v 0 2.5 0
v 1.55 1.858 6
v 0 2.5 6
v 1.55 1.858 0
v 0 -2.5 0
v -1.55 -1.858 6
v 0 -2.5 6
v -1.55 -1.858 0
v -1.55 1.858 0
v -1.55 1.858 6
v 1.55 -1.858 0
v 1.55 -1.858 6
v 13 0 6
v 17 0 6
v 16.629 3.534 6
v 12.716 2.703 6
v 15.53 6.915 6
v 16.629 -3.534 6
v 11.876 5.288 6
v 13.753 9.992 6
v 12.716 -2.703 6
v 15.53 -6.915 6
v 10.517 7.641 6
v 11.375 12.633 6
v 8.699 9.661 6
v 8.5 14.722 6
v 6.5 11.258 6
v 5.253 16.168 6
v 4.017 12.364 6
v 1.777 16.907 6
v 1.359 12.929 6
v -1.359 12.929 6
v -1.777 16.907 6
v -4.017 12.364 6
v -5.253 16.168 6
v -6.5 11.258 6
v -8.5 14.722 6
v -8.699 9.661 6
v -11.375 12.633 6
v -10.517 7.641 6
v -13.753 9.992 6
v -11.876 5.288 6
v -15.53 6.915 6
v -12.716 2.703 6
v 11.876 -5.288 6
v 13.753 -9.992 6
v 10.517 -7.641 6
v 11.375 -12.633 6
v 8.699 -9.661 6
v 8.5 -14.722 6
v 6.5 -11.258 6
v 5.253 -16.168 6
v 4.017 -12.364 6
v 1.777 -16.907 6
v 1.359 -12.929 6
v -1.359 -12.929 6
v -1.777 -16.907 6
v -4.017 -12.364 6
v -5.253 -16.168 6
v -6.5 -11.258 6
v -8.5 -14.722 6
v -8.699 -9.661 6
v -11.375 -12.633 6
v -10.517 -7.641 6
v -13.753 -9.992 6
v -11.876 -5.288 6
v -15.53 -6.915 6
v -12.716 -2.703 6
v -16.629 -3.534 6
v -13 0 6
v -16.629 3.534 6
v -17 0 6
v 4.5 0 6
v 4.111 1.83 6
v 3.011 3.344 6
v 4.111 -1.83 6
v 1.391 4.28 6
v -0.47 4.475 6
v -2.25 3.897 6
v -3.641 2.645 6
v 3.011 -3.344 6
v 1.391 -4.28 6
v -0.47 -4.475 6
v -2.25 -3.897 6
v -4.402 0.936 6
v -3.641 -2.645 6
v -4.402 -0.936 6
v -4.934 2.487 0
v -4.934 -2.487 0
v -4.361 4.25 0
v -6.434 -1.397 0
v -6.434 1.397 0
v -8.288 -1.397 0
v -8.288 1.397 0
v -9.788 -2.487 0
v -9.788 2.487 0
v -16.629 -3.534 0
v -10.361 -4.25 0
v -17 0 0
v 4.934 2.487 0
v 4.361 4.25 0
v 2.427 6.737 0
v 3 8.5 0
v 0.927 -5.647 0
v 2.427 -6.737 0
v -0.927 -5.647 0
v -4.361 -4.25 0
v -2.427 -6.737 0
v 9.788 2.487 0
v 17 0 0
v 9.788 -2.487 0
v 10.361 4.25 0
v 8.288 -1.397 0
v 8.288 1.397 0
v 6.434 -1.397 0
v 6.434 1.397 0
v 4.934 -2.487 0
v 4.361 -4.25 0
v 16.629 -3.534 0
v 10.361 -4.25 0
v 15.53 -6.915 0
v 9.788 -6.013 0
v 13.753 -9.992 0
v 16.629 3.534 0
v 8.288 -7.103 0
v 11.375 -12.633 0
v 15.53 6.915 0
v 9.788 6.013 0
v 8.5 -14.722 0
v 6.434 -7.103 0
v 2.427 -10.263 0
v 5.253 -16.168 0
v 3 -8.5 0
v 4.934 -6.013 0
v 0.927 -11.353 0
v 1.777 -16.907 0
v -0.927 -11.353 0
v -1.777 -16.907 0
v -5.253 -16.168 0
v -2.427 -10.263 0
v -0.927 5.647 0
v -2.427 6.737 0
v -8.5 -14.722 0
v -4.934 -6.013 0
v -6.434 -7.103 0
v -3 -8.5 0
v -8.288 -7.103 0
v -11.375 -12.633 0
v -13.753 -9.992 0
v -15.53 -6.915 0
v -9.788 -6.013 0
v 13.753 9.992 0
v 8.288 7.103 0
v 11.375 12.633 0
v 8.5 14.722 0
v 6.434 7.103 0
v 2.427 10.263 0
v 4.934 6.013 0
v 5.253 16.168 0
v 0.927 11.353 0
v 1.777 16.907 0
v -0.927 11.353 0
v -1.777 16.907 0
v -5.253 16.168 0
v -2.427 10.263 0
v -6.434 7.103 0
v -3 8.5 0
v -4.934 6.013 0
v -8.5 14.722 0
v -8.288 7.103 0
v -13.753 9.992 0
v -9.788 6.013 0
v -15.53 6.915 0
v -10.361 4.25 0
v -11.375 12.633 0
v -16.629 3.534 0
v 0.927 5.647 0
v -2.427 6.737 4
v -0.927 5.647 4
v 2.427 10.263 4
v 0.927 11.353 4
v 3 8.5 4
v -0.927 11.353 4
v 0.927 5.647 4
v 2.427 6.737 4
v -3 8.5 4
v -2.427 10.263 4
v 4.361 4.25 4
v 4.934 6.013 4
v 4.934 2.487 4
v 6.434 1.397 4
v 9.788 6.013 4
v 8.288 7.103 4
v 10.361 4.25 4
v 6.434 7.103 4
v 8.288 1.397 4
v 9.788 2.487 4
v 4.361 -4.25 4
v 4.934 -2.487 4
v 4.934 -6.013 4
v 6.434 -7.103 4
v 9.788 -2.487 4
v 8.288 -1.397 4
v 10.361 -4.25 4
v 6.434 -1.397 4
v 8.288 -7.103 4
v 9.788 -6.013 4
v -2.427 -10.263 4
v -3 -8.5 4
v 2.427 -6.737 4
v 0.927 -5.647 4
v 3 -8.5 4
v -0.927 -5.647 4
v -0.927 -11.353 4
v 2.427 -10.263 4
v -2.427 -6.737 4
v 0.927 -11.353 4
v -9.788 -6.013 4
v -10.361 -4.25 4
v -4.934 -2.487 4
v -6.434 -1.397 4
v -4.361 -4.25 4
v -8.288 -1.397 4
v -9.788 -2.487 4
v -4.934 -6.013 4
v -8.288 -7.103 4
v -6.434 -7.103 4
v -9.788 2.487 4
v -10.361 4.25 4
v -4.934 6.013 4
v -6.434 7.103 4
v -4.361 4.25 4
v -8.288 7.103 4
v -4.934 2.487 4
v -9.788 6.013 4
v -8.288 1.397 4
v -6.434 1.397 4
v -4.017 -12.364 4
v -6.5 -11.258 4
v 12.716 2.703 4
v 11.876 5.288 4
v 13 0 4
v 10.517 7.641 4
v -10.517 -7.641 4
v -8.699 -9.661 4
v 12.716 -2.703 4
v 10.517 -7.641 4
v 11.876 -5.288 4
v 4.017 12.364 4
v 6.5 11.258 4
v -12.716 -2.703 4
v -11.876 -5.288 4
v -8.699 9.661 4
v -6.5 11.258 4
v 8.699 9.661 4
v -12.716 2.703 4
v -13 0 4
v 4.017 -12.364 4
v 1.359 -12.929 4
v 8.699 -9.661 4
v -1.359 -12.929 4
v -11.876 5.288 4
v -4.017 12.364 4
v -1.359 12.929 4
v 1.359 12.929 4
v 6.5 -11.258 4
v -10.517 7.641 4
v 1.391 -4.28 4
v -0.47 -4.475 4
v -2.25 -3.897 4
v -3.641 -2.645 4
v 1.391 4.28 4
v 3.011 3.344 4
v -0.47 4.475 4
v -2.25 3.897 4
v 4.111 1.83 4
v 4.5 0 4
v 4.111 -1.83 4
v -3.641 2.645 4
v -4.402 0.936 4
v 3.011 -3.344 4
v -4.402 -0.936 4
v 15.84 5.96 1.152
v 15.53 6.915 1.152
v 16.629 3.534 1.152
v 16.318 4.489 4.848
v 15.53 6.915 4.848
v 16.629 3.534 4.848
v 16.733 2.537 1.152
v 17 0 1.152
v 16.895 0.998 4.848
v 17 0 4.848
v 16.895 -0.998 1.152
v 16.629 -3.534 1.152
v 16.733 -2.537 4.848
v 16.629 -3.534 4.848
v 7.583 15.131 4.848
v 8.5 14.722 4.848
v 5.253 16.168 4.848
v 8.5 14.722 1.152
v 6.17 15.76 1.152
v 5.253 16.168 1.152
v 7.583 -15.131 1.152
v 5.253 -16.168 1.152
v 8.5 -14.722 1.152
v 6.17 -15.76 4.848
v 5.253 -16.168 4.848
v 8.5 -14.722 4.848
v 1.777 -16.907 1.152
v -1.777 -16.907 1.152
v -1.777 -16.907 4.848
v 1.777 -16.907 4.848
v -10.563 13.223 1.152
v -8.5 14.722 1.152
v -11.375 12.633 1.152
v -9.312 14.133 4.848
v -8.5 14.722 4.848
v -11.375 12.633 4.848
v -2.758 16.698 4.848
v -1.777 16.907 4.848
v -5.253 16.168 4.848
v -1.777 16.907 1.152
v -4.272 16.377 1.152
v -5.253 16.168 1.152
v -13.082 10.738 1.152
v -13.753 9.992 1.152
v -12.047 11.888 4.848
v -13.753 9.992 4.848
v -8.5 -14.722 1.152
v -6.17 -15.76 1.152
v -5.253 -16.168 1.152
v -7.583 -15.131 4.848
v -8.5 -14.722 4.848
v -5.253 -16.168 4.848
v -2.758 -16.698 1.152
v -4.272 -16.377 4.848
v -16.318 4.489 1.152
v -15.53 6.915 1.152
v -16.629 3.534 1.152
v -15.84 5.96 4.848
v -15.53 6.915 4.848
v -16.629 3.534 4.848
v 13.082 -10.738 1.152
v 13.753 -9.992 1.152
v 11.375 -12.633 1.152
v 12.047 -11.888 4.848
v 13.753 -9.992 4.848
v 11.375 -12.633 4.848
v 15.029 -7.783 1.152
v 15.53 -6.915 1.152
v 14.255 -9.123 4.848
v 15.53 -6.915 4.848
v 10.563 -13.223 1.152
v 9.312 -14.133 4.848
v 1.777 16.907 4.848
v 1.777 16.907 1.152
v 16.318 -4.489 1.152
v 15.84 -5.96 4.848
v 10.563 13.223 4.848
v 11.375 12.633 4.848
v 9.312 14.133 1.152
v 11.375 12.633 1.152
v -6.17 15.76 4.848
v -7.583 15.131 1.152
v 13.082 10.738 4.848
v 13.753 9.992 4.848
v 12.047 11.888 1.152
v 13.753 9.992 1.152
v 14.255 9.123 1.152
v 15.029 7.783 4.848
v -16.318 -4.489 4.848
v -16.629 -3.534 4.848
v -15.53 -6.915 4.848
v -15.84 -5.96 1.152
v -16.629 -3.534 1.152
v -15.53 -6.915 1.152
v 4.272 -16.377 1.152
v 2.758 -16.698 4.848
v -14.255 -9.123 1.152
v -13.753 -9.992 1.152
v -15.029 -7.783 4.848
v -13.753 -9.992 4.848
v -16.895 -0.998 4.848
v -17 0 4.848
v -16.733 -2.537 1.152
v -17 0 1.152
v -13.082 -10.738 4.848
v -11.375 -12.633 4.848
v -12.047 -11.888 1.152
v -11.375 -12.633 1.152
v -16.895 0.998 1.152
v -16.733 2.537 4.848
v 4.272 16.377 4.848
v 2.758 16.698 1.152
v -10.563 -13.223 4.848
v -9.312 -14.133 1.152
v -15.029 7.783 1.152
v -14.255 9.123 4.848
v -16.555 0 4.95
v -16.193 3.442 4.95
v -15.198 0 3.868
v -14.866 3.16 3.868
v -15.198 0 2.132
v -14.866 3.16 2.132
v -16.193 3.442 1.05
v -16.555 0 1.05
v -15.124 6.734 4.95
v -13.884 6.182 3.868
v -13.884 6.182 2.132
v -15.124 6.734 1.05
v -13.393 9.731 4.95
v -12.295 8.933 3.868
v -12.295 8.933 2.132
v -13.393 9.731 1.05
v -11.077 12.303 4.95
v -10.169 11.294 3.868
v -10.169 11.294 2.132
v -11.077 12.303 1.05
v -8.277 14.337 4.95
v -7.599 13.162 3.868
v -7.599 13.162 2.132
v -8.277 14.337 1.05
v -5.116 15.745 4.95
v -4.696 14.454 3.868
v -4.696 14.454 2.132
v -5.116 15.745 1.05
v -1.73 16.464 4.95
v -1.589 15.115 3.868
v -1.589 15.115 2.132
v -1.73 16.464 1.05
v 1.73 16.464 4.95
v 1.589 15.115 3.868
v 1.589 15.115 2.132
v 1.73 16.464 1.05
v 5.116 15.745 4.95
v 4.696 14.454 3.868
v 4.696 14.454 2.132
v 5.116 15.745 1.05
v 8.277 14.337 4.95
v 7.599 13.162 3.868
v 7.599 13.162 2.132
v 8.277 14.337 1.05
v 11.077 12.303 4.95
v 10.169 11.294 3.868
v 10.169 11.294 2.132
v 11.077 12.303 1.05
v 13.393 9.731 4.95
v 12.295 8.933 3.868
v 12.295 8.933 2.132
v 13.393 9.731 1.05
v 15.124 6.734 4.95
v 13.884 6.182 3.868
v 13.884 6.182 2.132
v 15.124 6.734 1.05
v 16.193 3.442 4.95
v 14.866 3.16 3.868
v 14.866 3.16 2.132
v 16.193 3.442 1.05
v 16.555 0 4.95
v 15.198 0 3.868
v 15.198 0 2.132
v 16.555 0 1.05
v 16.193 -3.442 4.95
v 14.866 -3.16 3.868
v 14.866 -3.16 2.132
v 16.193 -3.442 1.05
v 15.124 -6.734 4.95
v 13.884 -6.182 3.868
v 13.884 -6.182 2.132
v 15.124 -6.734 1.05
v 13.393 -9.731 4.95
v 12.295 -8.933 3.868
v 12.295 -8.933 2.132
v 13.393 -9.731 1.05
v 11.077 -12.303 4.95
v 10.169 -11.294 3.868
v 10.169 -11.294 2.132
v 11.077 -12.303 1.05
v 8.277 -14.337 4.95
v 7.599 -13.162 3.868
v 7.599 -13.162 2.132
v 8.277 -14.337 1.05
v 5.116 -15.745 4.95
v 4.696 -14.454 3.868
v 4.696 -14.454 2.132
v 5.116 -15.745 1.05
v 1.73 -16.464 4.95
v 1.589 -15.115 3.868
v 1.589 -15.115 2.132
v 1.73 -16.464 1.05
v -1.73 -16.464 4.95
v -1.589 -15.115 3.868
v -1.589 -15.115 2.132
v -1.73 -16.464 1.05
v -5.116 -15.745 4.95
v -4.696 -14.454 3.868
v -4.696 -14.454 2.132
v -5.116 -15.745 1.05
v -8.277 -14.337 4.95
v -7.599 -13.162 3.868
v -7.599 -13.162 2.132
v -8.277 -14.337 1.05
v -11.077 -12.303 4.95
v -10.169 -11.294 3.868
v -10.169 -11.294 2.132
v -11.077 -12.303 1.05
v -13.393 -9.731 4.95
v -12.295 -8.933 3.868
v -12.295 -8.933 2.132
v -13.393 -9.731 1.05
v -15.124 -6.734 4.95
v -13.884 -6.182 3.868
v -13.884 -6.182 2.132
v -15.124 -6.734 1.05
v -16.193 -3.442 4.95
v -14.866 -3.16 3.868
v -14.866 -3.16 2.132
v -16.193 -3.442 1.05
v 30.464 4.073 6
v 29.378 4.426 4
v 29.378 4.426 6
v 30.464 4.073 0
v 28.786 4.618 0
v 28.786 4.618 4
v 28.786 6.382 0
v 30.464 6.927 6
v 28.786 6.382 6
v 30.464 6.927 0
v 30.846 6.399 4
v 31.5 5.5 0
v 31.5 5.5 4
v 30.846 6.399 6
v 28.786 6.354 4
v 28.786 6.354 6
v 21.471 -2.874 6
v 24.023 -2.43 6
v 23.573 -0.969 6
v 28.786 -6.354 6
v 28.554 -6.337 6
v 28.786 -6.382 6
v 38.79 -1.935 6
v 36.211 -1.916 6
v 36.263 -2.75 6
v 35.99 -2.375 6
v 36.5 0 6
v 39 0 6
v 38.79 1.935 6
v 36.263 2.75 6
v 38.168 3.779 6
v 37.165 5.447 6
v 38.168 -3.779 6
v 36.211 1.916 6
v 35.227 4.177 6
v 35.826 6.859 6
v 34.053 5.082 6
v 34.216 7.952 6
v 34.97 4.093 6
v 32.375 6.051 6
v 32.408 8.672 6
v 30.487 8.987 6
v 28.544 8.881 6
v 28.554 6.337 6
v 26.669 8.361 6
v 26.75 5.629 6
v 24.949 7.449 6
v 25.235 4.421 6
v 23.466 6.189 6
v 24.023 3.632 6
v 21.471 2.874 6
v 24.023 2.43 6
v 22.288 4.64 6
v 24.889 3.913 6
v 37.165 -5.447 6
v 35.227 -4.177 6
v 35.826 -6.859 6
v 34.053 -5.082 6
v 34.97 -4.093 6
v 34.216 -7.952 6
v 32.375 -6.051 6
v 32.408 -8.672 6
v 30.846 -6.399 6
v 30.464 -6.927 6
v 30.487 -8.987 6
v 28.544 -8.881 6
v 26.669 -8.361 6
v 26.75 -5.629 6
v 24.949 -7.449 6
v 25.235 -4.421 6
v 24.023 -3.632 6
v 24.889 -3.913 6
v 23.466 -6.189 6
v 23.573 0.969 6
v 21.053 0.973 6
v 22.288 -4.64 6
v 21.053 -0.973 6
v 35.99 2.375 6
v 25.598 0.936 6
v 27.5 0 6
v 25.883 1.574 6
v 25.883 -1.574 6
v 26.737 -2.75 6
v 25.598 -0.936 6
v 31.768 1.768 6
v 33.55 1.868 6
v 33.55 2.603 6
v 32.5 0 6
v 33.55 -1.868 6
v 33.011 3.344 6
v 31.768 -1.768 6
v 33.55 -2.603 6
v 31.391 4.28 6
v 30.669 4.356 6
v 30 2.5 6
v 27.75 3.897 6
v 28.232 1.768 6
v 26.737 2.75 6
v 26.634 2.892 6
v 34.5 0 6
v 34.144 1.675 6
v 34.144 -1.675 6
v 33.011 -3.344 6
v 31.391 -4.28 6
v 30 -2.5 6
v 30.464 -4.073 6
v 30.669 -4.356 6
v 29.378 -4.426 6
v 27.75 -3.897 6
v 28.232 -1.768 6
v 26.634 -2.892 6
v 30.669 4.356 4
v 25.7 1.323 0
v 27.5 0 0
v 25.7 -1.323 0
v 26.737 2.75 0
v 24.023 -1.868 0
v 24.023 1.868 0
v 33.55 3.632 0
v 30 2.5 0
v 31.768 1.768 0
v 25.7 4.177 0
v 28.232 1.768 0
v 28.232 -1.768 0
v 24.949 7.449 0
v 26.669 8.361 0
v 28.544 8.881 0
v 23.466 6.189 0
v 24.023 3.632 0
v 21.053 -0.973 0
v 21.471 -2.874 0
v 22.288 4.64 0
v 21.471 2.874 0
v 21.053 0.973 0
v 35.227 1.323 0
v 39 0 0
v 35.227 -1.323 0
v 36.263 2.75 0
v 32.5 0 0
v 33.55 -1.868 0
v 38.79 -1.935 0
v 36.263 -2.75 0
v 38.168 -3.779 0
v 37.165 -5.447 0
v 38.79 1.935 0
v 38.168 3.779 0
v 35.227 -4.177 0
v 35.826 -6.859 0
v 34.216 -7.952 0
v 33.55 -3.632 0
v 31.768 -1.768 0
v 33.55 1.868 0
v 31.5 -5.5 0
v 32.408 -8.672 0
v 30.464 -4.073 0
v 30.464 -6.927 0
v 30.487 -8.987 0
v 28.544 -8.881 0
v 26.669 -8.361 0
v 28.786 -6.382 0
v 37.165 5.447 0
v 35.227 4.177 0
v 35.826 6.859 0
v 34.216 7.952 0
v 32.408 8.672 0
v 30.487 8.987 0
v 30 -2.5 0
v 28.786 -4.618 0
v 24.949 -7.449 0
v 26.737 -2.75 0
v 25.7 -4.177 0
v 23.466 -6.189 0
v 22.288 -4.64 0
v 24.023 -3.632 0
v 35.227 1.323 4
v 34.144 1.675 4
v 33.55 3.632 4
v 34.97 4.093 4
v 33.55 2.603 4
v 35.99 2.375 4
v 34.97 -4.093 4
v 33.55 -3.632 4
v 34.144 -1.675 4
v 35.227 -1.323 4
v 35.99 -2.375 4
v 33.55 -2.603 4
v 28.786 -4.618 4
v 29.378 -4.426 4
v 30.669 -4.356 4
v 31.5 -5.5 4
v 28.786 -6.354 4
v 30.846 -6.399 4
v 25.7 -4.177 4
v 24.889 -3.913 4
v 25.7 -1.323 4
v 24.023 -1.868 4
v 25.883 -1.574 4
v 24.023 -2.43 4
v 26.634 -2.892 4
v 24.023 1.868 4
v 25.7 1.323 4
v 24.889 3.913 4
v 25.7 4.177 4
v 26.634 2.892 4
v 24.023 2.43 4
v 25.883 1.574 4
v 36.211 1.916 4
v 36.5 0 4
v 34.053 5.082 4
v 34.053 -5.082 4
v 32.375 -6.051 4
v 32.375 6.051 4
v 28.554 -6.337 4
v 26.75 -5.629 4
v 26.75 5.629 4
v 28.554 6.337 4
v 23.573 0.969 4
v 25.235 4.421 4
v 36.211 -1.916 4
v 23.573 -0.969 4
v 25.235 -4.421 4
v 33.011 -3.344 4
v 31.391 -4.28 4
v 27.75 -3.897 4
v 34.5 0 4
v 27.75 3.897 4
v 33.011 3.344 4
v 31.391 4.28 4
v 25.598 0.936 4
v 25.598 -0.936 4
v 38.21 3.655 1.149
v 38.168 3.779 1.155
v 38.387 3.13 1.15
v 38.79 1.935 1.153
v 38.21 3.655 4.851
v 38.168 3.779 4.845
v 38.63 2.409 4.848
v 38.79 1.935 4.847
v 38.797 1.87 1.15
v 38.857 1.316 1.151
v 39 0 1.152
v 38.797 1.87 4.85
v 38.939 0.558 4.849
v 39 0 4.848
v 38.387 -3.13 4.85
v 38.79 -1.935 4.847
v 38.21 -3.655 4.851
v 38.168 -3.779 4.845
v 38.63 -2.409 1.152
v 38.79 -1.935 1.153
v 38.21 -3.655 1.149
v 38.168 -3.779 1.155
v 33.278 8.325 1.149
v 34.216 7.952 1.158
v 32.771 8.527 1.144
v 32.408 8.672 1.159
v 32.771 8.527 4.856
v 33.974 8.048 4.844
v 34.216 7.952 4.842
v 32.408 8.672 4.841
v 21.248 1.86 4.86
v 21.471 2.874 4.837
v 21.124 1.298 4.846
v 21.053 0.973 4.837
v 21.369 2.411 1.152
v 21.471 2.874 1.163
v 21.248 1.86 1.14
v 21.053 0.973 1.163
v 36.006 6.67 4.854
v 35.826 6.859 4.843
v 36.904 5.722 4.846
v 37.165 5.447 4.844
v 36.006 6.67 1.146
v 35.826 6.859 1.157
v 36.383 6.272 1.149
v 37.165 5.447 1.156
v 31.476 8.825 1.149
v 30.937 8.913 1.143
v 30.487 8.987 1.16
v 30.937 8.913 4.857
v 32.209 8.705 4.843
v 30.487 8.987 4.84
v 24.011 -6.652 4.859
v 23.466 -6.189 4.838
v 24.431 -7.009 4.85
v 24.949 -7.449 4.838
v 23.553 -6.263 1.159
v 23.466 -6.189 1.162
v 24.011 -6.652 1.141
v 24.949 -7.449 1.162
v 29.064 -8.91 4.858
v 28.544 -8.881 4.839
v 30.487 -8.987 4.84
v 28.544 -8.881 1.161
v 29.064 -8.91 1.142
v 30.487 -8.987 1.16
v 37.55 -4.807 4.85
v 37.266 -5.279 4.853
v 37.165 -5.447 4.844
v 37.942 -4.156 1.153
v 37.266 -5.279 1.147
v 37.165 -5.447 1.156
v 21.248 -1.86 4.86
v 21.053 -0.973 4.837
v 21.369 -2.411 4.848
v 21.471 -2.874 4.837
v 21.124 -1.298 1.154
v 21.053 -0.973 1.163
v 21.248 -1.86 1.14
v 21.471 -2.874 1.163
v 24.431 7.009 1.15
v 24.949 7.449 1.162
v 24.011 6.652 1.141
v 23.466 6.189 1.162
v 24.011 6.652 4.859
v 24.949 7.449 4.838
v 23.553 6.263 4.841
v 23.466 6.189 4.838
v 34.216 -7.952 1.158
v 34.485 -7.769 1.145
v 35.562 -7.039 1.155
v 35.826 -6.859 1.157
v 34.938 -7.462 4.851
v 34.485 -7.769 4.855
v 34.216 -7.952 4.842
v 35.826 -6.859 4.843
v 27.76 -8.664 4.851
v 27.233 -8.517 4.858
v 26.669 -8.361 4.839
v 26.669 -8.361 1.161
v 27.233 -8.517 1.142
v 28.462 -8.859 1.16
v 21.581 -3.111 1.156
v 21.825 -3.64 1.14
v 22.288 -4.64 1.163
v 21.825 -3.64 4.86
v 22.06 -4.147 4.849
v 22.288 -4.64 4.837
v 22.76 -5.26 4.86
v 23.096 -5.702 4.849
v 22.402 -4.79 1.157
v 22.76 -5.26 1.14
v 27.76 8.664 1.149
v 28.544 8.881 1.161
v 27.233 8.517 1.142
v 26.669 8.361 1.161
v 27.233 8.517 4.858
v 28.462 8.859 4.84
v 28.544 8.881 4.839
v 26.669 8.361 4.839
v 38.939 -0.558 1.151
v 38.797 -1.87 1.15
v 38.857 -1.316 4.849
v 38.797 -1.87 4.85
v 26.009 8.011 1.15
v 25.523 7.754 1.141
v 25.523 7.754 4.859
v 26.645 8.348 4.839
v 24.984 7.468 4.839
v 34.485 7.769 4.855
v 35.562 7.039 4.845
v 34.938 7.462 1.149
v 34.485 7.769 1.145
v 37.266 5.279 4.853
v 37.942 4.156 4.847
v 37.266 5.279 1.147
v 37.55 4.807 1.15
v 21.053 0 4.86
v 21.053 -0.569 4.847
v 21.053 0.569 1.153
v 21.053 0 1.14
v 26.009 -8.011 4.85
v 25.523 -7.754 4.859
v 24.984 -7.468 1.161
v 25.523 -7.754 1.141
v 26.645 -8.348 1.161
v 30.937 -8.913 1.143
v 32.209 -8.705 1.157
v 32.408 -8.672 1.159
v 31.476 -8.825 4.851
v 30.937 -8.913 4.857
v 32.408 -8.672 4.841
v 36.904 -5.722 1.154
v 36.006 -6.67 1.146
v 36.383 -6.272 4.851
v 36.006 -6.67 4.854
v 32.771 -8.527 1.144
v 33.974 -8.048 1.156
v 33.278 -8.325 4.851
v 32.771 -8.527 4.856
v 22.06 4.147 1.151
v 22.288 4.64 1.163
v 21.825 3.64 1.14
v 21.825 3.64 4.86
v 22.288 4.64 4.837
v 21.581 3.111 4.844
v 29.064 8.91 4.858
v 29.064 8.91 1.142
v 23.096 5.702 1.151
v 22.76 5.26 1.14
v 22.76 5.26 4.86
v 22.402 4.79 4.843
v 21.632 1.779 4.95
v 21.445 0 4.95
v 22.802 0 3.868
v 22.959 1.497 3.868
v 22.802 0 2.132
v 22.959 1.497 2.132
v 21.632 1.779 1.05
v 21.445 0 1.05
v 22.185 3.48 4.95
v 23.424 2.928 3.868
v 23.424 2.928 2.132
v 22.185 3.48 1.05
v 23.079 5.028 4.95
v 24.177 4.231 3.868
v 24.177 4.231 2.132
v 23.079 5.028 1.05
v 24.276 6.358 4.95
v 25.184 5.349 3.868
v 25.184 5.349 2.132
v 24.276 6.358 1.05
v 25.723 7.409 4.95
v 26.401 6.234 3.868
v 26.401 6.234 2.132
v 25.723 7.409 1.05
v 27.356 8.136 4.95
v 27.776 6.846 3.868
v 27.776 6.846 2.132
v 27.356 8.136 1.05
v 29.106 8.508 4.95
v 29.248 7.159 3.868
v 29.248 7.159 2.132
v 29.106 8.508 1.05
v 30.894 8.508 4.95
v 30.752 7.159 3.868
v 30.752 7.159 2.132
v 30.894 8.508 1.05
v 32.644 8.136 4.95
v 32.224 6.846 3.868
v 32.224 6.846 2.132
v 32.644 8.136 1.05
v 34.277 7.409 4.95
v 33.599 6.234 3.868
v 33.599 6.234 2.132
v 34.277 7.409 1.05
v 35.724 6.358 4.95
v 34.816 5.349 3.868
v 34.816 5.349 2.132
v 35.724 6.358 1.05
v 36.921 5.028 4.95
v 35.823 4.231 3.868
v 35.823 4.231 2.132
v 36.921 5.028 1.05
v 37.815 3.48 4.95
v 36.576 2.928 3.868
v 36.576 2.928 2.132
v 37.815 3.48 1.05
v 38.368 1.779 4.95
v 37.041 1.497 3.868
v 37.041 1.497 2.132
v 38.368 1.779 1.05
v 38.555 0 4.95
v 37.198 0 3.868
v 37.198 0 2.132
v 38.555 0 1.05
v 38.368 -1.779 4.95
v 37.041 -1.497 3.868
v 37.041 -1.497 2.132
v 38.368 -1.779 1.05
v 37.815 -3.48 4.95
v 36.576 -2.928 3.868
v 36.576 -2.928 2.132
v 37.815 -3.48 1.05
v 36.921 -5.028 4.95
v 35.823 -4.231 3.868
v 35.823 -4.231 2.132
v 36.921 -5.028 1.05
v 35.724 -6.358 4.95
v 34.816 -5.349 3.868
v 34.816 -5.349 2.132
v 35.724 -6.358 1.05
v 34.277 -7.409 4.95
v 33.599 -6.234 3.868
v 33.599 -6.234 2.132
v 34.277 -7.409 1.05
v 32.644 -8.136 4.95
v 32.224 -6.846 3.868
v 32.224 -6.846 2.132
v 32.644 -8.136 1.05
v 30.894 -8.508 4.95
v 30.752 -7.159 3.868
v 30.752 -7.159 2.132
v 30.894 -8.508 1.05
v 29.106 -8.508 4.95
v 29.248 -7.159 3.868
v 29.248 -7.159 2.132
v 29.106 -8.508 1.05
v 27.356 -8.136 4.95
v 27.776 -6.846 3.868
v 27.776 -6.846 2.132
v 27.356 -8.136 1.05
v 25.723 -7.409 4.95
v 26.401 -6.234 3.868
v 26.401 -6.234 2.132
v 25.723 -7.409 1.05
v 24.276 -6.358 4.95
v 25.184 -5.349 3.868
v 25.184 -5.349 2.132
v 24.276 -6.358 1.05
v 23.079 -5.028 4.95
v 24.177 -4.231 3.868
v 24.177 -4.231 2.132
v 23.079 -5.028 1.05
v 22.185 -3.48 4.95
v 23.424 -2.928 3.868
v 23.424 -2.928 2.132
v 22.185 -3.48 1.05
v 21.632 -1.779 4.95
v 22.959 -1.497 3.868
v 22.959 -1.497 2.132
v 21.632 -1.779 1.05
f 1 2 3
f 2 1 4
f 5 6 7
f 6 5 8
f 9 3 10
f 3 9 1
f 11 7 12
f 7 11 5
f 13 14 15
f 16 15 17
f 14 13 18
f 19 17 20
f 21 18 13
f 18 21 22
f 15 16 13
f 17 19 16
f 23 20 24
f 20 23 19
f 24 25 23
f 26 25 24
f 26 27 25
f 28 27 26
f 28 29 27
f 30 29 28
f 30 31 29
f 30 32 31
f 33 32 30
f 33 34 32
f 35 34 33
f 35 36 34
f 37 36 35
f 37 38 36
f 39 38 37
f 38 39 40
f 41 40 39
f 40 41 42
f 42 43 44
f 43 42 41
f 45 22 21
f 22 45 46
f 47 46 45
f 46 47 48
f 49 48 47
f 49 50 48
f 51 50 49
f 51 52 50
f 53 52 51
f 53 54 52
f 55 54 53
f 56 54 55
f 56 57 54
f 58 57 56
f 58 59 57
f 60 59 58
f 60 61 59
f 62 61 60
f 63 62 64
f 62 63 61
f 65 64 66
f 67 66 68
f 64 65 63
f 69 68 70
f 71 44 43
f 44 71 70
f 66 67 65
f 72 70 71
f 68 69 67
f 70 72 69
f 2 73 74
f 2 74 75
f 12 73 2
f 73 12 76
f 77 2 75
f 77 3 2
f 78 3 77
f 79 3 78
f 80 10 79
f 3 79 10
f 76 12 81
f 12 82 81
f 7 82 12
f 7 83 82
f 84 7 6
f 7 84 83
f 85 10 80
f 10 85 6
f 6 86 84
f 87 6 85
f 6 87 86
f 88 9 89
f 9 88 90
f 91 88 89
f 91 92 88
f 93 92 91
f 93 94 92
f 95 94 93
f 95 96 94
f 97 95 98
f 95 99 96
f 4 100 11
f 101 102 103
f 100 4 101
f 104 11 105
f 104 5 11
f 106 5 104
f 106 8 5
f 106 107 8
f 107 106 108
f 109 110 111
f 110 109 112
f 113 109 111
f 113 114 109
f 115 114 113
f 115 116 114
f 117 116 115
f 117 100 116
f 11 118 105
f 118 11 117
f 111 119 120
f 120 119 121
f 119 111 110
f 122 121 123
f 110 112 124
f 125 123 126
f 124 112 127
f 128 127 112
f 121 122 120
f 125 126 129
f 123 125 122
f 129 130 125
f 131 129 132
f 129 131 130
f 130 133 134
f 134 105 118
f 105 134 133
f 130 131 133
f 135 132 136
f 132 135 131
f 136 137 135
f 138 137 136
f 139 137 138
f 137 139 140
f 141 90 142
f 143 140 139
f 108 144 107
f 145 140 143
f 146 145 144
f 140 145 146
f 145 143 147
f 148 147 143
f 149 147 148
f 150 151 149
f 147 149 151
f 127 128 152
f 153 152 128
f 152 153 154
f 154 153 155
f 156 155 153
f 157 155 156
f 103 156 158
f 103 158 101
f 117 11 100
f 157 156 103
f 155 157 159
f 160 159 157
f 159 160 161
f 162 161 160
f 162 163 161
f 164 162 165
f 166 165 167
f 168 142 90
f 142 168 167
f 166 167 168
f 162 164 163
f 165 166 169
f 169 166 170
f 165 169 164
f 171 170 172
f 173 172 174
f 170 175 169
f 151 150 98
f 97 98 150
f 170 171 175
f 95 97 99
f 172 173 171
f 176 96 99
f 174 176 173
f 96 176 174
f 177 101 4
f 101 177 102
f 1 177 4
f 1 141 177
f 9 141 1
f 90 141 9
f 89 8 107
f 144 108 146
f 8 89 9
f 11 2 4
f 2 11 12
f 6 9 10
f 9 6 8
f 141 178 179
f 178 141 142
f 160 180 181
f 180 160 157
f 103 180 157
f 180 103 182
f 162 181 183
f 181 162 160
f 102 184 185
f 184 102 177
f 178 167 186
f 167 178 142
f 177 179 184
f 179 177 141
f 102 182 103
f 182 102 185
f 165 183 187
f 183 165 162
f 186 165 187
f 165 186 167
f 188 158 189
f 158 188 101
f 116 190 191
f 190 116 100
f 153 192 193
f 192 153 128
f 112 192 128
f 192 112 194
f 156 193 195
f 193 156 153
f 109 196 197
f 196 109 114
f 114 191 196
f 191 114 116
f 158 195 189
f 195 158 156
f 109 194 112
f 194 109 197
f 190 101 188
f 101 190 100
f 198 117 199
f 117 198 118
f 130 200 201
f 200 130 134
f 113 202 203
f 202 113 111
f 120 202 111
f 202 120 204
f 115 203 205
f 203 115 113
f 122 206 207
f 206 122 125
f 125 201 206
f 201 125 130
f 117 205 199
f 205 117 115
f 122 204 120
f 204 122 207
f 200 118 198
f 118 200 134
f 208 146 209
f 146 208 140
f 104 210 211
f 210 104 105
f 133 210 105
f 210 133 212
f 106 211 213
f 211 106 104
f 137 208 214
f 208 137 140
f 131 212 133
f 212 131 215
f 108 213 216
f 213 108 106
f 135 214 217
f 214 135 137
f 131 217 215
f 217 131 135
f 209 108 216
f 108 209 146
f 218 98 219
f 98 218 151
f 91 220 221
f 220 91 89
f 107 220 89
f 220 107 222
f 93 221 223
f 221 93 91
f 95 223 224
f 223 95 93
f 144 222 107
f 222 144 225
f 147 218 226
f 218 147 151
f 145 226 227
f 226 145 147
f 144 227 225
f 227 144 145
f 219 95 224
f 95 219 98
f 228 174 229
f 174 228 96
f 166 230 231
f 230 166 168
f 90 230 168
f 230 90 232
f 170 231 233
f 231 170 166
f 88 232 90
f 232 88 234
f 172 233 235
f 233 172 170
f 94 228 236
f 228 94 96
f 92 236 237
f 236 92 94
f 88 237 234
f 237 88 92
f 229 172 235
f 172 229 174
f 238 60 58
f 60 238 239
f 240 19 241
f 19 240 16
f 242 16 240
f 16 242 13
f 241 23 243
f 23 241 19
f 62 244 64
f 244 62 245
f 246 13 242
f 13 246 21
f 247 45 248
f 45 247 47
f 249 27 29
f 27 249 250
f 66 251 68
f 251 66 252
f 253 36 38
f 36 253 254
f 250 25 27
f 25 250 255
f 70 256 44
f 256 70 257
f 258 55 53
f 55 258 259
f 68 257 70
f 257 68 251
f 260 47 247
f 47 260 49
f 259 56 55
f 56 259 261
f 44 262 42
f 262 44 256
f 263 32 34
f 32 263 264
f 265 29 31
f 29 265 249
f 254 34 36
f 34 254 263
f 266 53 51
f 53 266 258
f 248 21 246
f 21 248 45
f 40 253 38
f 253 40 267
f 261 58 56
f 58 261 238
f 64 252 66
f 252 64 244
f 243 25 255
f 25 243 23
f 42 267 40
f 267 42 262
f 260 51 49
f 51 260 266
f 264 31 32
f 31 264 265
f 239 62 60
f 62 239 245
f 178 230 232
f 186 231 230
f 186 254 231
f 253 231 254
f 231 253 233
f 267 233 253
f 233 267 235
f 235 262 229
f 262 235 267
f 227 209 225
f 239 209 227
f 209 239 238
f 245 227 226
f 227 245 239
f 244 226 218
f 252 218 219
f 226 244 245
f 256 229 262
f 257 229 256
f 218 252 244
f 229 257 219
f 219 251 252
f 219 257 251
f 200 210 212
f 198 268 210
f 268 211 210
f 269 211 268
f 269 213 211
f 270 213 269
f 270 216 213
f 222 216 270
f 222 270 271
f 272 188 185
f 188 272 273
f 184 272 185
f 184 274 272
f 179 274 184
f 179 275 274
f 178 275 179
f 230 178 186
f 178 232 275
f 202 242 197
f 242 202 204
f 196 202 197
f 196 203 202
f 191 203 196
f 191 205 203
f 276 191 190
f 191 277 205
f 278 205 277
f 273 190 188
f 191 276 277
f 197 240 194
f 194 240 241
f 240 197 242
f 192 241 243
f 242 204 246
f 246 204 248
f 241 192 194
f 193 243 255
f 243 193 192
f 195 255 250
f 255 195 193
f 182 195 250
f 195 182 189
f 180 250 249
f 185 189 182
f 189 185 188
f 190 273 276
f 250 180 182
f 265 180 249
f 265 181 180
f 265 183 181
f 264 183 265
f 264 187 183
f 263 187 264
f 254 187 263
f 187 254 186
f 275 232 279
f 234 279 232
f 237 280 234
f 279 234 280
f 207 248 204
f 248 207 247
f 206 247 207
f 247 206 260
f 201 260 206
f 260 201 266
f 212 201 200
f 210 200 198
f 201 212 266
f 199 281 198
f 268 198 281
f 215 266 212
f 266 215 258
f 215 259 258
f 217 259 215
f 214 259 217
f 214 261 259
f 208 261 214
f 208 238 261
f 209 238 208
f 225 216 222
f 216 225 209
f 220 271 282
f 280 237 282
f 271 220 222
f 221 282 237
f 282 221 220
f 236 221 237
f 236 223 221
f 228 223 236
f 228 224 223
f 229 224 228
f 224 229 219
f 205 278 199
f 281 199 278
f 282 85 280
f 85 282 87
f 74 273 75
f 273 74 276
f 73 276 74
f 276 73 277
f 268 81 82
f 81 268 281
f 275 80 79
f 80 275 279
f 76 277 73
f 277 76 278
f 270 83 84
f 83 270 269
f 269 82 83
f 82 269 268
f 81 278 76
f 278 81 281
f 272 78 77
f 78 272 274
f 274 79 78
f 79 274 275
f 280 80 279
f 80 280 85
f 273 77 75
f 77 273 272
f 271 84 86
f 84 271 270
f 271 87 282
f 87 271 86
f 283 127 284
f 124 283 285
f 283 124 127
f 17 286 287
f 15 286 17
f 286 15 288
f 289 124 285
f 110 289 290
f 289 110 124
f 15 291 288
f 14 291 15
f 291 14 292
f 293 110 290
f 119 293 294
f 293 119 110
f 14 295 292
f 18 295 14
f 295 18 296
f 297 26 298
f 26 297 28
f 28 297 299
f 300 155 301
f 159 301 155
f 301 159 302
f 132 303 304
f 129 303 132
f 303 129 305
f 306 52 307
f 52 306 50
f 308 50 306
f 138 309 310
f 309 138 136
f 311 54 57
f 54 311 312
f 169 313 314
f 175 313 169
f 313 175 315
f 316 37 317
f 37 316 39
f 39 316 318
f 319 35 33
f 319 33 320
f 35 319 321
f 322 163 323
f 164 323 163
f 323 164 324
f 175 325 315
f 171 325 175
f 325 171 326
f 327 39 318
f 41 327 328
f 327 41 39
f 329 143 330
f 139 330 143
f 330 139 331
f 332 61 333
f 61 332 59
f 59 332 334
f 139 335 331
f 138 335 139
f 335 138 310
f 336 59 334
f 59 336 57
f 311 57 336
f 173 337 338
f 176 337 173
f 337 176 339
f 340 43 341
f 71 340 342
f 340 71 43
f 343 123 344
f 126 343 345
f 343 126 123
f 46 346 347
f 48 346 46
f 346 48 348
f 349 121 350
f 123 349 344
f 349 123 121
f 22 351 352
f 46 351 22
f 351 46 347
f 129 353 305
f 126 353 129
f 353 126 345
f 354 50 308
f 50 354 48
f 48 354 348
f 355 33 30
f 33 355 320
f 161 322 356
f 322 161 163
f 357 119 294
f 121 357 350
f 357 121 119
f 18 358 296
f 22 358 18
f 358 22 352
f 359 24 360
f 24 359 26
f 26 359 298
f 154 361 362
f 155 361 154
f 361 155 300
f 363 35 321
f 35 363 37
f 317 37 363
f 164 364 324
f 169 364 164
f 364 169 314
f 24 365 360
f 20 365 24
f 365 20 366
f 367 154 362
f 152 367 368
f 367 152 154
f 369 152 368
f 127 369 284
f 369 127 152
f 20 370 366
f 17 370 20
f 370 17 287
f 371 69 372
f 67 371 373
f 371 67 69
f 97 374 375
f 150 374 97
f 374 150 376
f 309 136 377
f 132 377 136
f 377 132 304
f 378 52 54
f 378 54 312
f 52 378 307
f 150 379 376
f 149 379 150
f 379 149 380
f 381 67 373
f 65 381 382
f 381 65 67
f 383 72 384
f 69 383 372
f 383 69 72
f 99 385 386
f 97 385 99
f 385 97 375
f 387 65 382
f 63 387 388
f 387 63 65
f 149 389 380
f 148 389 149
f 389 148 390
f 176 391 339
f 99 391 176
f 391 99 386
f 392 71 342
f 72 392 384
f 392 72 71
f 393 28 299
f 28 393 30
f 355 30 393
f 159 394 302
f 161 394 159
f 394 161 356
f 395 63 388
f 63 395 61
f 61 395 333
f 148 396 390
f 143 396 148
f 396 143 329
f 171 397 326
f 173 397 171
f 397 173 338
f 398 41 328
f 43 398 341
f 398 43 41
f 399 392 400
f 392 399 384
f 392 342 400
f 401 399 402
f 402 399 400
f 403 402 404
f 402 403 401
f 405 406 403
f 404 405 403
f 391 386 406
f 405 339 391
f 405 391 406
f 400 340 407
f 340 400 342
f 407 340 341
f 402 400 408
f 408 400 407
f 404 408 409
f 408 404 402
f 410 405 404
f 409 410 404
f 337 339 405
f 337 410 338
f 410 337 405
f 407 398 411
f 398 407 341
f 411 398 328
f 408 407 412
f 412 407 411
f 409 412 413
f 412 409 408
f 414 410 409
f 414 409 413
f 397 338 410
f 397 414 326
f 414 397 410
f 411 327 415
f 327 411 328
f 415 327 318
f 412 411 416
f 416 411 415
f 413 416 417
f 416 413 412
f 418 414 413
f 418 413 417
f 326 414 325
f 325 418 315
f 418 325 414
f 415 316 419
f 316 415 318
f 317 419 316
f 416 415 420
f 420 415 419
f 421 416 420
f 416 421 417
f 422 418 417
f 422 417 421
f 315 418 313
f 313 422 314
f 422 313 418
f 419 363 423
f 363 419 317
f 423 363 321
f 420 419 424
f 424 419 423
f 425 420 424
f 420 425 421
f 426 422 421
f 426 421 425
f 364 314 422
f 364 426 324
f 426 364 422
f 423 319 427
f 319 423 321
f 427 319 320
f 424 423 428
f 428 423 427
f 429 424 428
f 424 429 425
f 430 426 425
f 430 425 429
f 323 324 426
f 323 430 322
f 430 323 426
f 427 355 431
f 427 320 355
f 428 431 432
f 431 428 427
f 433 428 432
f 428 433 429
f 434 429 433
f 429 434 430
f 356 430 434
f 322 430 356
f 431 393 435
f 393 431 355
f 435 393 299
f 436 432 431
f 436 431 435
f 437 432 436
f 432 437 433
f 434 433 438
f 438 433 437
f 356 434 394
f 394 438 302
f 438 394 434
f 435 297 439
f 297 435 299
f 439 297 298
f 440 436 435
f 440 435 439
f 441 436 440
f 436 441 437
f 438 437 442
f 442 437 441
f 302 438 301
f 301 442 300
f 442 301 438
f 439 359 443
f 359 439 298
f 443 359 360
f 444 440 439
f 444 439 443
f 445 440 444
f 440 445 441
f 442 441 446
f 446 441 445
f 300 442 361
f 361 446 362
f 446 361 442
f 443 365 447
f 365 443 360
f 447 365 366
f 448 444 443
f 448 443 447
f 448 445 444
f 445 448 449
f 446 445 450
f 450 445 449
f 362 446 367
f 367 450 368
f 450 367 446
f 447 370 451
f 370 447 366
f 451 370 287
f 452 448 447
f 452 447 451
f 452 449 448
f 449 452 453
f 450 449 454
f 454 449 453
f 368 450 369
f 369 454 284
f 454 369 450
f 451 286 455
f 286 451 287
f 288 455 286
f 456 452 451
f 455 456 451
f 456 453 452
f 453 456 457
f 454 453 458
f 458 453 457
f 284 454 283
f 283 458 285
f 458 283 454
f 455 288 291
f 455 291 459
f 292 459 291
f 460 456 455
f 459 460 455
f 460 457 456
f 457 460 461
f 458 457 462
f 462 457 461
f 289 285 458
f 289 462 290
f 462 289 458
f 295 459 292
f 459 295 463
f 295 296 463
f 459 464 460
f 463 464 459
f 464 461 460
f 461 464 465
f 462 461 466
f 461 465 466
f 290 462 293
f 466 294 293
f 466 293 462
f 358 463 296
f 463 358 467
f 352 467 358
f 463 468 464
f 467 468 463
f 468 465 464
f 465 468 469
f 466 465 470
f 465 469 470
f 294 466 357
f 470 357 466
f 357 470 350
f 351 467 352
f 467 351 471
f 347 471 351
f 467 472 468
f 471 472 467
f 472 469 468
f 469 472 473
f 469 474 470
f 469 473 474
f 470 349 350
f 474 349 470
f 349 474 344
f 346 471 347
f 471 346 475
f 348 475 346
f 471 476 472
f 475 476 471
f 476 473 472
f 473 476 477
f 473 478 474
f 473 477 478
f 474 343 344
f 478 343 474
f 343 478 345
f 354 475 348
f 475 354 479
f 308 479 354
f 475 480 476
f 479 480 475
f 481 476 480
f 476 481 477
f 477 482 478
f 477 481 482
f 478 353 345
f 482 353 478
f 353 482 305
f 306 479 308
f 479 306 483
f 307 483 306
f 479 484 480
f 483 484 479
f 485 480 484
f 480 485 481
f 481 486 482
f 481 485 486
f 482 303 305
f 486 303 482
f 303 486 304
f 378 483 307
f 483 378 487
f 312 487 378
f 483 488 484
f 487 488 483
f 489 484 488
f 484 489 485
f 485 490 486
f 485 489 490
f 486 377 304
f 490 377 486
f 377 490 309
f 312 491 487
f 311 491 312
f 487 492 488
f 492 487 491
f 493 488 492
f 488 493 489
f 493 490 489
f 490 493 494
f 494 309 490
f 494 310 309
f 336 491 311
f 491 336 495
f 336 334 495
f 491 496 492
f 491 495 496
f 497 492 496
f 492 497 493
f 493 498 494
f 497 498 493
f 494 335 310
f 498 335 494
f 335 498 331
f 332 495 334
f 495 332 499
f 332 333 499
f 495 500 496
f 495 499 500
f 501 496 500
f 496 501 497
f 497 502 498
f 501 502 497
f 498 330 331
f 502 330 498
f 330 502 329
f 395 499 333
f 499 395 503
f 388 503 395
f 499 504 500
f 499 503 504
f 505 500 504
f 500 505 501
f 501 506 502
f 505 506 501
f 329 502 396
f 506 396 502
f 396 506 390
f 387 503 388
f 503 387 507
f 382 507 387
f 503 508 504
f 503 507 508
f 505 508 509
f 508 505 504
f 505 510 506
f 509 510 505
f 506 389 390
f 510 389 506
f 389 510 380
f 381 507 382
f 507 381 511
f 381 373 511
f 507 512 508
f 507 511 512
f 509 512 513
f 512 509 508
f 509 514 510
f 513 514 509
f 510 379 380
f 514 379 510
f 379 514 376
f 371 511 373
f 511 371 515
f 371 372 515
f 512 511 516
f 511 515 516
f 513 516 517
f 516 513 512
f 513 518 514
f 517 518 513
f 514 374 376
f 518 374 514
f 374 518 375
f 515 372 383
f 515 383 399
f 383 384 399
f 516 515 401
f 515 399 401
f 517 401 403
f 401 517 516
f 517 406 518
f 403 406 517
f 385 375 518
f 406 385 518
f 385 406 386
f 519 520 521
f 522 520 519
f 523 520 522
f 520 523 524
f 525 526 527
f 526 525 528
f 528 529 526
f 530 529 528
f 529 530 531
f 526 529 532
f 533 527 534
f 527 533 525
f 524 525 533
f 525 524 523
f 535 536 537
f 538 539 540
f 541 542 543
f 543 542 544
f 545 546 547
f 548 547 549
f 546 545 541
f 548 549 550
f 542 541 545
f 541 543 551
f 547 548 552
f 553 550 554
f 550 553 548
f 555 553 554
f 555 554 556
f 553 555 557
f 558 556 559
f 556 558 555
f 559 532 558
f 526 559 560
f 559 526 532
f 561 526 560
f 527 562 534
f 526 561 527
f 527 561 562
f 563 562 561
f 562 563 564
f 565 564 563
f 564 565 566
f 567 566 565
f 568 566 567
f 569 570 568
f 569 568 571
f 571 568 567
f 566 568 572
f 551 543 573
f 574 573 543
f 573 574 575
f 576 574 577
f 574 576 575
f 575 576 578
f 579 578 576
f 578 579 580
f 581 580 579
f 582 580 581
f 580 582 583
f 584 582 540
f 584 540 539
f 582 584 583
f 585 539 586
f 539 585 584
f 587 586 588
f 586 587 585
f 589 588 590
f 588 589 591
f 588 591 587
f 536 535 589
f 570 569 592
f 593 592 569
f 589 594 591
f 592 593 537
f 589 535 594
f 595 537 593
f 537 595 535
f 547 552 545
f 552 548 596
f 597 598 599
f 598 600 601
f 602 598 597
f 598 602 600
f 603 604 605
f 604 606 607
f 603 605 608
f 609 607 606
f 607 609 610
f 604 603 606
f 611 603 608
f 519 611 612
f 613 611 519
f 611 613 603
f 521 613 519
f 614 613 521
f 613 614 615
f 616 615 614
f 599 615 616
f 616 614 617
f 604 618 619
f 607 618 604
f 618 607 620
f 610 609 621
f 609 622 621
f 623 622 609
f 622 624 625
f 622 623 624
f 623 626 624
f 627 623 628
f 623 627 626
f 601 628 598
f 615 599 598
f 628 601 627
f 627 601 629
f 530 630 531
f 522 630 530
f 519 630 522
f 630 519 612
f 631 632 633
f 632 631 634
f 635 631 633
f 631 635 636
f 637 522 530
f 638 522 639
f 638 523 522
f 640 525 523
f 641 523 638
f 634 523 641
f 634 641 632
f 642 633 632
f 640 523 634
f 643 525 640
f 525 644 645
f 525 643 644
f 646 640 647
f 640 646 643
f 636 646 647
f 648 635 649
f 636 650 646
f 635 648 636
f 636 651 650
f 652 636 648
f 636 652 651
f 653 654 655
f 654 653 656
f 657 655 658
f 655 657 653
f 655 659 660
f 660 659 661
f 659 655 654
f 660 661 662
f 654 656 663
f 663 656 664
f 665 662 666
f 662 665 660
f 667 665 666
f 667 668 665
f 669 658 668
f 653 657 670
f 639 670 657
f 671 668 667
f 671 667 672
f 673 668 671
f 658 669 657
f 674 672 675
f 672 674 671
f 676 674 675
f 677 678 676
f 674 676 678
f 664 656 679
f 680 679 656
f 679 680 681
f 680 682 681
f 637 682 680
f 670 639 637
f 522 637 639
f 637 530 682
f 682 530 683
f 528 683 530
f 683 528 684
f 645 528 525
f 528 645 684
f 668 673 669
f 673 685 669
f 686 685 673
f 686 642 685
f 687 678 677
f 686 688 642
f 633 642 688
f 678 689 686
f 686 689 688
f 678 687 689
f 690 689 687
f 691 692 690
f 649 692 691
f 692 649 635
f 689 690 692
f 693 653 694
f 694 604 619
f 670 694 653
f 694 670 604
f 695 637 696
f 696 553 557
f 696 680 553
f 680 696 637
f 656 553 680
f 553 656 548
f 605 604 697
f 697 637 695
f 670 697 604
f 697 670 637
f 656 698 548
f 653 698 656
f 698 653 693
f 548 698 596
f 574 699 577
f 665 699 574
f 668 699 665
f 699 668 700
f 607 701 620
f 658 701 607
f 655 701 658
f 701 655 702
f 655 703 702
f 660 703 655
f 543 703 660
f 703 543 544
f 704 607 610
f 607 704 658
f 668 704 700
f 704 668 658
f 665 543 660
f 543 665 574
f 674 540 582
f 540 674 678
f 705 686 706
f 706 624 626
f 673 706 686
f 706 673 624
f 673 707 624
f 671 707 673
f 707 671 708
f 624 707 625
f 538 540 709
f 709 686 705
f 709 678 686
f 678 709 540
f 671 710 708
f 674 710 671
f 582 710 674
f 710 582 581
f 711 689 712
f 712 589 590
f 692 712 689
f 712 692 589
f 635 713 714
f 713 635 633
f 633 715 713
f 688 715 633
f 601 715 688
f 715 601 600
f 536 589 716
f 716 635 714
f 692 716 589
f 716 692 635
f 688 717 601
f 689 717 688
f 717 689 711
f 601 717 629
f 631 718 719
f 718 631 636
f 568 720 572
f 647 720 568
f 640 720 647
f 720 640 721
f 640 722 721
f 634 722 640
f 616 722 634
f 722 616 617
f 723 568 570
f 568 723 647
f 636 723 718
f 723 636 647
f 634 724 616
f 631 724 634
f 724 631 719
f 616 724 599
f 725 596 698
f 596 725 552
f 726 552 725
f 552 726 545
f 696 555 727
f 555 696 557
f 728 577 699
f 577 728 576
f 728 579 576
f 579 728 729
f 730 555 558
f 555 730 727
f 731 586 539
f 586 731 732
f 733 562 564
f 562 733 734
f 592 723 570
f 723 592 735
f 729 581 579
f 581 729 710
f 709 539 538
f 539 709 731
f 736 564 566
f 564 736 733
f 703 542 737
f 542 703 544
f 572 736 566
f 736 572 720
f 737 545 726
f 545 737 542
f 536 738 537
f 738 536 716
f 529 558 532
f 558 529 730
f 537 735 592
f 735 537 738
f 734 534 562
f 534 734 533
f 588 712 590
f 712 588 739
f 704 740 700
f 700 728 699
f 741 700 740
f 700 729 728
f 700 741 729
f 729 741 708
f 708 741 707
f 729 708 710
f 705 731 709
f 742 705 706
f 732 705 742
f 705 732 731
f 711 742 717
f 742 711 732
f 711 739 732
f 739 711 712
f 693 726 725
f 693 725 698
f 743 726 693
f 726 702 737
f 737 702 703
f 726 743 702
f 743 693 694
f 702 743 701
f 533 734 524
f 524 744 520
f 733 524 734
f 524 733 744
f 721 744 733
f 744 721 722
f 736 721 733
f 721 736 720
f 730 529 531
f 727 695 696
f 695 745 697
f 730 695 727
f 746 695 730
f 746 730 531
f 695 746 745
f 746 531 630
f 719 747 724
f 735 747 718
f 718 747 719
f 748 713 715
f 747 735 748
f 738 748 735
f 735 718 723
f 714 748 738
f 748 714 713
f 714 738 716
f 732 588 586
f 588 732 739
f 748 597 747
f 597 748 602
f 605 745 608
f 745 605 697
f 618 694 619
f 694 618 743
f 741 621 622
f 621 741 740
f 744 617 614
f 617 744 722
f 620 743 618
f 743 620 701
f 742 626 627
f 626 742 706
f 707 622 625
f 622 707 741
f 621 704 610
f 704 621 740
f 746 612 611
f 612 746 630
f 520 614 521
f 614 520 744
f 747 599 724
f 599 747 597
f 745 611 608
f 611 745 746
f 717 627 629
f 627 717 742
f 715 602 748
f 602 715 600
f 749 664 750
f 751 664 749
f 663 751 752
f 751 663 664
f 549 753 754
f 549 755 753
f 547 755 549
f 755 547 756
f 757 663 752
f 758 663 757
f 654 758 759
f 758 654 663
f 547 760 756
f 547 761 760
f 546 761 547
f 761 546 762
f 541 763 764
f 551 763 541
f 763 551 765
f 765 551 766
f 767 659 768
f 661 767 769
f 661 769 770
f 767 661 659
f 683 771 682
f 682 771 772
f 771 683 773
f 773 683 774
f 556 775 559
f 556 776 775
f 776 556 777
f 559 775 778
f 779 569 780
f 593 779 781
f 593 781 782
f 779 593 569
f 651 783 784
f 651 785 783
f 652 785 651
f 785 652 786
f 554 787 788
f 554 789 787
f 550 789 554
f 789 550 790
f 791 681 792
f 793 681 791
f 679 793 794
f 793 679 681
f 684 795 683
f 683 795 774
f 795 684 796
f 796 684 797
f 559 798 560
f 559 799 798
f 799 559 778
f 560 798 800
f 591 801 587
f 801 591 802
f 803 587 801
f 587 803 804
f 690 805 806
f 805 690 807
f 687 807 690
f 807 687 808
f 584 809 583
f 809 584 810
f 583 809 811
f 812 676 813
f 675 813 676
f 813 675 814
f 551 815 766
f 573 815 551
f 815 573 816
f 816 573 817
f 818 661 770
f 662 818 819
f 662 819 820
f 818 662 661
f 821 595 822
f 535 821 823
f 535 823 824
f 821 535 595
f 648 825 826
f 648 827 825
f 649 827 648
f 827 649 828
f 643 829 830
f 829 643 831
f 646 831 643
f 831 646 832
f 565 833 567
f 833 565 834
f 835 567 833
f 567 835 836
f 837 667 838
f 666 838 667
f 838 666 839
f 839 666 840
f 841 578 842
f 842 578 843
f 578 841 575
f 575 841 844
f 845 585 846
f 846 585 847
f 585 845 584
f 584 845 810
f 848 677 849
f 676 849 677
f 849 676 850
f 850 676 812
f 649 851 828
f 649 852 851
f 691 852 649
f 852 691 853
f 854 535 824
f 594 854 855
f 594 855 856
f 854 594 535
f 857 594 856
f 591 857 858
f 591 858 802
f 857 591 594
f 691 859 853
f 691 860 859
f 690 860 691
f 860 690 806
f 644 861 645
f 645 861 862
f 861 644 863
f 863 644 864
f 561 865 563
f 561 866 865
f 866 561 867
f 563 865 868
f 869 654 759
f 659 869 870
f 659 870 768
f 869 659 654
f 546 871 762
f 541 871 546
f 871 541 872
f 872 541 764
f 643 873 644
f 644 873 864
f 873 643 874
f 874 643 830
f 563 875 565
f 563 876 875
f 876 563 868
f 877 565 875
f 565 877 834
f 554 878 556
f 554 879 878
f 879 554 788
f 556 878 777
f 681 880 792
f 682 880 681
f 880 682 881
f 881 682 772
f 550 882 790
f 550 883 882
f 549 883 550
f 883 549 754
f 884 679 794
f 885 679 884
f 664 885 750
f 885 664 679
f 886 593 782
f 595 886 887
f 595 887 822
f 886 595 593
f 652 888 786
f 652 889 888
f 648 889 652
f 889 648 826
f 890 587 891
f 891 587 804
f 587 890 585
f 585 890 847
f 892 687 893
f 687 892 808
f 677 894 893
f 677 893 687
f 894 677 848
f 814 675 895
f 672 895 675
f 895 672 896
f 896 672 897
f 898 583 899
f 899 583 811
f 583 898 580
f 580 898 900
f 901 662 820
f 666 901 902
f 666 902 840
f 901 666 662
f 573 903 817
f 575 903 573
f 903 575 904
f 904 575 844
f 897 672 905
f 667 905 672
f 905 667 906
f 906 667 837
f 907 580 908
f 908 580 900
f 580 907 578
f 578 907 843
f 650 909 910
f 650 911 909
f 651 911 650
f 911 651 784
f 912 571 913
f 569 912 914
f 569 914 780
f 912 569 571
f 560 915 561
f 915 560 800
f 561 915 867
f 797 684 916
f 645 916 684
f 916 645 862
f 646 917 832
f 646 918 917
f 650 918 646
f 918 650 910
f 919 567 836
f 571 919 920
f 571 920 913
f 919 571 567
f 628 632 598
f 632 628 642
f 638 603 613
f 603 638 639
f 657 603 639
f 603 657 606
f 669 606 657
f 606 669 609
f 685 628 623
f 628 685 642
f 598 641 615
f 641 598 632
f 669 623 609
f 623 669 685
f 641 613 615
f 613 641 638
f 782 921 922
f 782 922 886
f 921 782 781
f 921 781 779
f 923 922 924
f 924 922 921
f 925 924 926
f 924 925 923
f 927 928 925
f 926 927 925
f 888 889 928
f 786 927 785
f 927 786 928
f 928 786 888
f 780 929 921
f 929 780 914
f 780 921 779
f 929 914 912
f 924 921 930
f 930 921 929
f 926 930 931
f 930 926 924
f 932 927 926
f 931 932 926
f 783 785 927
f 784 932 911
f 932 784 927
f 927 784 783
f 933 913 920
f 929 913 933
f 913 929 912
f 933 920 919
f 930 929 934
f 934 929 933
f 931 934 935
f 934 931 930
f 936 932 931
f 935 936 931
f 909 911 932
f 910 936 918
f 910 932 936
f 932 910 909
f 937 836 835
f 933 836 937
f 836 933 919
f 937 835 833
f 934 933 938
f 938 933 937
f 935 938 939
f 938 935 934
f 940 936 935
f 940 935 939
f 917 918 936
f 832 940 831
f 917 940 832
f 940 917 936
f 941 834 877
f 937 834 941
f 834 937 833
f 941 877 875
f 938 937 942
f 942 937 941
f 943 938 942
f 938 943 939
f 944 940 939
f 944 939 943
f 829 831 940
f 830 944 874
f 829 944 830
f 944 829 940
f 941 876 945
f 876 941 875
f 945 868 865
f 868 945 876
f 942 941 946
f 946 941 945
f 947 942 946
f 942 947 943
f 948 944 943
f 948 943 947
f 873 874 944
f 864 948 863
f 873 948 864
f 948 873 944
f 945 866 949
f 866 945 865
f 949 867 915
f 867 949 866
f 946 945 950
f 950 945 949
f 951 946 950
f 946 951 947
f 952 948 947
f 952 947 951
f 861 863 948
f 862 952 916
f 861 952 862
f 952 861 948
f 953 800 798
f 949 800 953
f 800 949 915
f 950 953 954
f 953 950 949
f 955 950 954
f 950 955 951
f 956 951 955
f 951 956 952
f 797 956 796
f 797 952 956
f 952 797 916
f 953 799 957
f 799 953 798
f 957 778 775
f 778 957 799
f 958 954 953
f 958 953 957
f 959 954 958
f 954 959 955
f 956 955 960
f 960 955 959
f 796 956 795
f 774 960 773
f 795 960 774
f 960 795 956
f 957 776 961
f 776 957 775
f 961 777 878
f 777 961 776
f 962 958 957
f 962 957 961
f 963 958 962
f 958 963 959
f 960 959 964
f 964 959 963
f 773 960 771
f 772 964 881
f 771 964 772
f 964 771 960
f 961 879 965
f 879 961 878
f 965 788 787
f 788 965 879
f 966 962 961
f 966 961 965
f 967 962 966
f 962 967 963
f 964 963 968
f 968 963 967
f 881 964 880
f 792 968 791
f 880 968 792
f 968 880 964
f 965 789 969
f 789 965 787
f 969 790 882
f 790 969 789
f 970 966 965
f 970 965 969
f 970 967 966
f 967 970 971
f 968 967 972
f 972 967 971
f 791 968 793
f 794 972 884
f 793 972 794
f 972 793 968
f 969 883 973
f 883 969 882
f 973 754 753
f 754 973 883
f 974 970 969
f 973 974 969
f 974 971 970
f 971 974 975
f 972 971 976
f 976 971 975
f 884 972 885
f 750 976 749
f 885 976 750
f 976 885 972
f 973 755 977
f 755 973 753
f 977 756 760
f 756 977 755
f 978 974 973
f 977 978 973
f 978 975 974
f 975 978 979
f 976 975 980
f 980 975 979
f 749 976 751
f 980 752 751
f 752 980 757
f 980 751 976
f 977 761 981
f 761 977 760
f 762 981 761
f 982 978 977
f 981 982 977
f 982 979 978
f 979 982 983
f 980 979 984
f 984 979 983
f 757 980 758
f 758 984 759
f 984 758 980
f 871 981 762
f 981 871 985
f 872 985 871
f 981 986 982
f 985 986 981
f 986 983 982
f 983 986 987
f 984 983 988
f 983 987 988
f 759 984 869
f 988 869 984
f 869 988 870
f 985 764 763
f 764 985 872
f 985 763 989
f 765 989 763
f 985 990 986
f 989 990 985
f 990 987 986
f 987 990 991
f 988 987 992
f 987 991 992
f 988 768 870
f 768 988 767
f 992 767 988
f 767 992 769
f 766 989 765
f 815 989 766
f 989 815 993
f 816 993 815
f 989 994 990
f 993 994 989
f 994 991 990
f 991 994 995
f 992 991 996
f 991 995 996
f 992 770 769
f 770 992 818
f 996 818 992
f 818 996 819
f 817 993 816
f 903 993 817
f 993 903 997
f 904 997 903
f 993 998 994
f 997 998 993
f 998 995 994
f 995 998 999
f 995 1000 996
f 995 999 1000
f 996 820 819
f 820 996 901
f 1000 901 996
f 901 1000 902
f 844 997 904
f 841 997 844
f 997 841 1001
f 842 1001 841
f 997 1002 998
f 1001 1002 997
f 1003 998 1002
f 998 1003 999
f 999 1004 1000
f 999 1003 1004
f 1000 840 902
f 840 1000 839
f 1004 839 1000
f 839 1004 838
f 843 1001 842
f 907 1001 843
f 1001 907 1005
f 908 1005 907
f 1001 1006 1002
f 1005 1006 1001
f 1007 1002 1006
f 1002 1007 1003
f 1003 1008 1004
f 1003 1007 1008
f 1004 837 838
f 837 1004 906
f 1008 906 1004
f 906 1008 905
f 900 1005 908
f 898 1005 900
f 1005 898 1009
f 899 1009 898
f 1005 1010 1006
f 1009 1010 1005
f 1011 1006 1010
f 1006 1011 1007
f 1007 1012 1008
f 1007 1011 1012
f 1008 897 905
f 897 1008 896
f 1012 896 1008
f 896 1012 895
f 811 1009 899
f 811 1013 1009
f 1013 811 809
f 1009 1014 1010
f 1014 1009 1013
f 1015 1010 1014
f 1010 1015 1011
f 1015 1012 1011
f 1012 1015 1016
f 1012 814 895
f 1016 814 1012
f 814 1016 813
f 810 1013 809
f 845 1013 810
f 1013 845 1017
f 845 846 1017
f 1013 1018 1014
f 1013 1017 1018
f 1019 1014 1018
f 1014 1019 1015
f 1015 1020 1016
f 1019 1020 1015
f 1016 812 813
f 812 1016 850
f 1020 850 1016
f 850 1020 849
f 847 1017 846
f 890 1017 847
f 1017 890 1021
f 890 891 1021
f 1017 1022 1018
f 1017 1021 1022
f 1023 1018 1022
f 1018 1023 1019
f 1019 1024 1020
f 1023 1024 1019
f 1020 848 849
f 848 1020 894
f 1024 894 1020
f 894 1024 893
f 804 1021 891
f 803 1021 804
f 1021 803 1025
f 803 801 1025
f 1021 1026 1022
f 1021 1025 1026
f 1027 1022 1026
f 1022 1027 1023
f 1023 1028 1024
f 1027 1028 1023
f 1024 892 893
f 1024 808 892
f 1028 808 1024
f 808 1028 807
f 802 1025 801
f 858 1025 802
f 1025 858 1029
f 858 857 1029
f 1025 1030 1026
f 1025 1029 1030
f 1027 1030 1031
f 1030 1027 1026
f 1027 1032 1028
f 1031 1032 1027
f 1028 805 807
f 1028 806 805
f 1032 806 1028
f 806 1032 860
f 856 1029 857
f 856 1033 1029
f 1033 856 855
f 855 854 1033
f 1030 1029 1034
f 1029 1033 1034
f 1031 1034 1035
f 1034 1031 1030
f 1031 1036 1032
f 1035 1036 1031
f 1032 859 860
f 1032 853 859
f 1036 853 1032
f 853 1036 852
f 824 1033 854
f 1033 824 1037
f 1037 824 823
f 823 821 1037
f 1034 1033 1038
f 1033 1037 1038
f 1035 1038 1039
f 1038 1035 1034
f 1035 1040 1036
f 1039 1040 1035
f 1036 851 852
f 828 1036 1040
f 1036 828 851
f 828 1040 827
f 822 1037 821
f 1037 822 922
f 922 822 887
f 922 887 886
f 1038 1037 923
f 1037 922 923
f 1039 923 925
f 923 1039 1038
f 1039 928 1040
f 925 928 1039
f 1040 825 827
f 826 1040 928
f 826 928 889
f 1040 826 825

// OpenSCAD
module pulley(motor){
    H = 6;                          // Altura
    Rp = 2;                         // Radio de la pista (menor que H/2)
    R = (motor ? 15 : 7)+Rp;       // Radio exterior

    Ra = 2.50;                      // Radio eje
    Rb = 1.55;                      // Achatamiento

    // Orificios
    Nh = 6;             // Cantidad
    Rh = motor ? 3 : 1.5;           // Radio 
    Dh = (motor ? R-Rp : R)/2+1;    // Separacion desde el centro

    // Ahuecamiento
    Di = 2;                         // Borde interior
    De = motor ? 4 : 2.5;           // Borde exterior
    e = 2;                          // Profundidad

    difference(){
        cylinder(r = R, h = H); // Envolvente

        if(motor){// Eje achatado
            intersection(){
                cylinder(r = Ra, h = H);
                translate([0,0,H/2])
                    cube([Rb*2,Ra*2,H], center = true);
            }
        }else{
            cylinder(r = Ra, h = H); // Eje
        }

        // Pista para la cuerda convexa
        rotate_extrude(convexity = 10)
        translate([R, H/2, 0])
            circle(r = Rp);  
        
        // Orificios
        for(angle = [0 : 360/Nh : 360])
            translate([Dh*sin(angle),Dh*cos(angle),0])
                cylinder(r = Rh, h = H); 

        // Ahuecamiento superior
        translate([0,0,H-e])
            difference(){
                cylinder(r = R-De, h = e);
                cylinder(r = Ra+Di, h = e);
            }
    }
}

pulley(true);
translate([30,0,0])
    pulley(false);
